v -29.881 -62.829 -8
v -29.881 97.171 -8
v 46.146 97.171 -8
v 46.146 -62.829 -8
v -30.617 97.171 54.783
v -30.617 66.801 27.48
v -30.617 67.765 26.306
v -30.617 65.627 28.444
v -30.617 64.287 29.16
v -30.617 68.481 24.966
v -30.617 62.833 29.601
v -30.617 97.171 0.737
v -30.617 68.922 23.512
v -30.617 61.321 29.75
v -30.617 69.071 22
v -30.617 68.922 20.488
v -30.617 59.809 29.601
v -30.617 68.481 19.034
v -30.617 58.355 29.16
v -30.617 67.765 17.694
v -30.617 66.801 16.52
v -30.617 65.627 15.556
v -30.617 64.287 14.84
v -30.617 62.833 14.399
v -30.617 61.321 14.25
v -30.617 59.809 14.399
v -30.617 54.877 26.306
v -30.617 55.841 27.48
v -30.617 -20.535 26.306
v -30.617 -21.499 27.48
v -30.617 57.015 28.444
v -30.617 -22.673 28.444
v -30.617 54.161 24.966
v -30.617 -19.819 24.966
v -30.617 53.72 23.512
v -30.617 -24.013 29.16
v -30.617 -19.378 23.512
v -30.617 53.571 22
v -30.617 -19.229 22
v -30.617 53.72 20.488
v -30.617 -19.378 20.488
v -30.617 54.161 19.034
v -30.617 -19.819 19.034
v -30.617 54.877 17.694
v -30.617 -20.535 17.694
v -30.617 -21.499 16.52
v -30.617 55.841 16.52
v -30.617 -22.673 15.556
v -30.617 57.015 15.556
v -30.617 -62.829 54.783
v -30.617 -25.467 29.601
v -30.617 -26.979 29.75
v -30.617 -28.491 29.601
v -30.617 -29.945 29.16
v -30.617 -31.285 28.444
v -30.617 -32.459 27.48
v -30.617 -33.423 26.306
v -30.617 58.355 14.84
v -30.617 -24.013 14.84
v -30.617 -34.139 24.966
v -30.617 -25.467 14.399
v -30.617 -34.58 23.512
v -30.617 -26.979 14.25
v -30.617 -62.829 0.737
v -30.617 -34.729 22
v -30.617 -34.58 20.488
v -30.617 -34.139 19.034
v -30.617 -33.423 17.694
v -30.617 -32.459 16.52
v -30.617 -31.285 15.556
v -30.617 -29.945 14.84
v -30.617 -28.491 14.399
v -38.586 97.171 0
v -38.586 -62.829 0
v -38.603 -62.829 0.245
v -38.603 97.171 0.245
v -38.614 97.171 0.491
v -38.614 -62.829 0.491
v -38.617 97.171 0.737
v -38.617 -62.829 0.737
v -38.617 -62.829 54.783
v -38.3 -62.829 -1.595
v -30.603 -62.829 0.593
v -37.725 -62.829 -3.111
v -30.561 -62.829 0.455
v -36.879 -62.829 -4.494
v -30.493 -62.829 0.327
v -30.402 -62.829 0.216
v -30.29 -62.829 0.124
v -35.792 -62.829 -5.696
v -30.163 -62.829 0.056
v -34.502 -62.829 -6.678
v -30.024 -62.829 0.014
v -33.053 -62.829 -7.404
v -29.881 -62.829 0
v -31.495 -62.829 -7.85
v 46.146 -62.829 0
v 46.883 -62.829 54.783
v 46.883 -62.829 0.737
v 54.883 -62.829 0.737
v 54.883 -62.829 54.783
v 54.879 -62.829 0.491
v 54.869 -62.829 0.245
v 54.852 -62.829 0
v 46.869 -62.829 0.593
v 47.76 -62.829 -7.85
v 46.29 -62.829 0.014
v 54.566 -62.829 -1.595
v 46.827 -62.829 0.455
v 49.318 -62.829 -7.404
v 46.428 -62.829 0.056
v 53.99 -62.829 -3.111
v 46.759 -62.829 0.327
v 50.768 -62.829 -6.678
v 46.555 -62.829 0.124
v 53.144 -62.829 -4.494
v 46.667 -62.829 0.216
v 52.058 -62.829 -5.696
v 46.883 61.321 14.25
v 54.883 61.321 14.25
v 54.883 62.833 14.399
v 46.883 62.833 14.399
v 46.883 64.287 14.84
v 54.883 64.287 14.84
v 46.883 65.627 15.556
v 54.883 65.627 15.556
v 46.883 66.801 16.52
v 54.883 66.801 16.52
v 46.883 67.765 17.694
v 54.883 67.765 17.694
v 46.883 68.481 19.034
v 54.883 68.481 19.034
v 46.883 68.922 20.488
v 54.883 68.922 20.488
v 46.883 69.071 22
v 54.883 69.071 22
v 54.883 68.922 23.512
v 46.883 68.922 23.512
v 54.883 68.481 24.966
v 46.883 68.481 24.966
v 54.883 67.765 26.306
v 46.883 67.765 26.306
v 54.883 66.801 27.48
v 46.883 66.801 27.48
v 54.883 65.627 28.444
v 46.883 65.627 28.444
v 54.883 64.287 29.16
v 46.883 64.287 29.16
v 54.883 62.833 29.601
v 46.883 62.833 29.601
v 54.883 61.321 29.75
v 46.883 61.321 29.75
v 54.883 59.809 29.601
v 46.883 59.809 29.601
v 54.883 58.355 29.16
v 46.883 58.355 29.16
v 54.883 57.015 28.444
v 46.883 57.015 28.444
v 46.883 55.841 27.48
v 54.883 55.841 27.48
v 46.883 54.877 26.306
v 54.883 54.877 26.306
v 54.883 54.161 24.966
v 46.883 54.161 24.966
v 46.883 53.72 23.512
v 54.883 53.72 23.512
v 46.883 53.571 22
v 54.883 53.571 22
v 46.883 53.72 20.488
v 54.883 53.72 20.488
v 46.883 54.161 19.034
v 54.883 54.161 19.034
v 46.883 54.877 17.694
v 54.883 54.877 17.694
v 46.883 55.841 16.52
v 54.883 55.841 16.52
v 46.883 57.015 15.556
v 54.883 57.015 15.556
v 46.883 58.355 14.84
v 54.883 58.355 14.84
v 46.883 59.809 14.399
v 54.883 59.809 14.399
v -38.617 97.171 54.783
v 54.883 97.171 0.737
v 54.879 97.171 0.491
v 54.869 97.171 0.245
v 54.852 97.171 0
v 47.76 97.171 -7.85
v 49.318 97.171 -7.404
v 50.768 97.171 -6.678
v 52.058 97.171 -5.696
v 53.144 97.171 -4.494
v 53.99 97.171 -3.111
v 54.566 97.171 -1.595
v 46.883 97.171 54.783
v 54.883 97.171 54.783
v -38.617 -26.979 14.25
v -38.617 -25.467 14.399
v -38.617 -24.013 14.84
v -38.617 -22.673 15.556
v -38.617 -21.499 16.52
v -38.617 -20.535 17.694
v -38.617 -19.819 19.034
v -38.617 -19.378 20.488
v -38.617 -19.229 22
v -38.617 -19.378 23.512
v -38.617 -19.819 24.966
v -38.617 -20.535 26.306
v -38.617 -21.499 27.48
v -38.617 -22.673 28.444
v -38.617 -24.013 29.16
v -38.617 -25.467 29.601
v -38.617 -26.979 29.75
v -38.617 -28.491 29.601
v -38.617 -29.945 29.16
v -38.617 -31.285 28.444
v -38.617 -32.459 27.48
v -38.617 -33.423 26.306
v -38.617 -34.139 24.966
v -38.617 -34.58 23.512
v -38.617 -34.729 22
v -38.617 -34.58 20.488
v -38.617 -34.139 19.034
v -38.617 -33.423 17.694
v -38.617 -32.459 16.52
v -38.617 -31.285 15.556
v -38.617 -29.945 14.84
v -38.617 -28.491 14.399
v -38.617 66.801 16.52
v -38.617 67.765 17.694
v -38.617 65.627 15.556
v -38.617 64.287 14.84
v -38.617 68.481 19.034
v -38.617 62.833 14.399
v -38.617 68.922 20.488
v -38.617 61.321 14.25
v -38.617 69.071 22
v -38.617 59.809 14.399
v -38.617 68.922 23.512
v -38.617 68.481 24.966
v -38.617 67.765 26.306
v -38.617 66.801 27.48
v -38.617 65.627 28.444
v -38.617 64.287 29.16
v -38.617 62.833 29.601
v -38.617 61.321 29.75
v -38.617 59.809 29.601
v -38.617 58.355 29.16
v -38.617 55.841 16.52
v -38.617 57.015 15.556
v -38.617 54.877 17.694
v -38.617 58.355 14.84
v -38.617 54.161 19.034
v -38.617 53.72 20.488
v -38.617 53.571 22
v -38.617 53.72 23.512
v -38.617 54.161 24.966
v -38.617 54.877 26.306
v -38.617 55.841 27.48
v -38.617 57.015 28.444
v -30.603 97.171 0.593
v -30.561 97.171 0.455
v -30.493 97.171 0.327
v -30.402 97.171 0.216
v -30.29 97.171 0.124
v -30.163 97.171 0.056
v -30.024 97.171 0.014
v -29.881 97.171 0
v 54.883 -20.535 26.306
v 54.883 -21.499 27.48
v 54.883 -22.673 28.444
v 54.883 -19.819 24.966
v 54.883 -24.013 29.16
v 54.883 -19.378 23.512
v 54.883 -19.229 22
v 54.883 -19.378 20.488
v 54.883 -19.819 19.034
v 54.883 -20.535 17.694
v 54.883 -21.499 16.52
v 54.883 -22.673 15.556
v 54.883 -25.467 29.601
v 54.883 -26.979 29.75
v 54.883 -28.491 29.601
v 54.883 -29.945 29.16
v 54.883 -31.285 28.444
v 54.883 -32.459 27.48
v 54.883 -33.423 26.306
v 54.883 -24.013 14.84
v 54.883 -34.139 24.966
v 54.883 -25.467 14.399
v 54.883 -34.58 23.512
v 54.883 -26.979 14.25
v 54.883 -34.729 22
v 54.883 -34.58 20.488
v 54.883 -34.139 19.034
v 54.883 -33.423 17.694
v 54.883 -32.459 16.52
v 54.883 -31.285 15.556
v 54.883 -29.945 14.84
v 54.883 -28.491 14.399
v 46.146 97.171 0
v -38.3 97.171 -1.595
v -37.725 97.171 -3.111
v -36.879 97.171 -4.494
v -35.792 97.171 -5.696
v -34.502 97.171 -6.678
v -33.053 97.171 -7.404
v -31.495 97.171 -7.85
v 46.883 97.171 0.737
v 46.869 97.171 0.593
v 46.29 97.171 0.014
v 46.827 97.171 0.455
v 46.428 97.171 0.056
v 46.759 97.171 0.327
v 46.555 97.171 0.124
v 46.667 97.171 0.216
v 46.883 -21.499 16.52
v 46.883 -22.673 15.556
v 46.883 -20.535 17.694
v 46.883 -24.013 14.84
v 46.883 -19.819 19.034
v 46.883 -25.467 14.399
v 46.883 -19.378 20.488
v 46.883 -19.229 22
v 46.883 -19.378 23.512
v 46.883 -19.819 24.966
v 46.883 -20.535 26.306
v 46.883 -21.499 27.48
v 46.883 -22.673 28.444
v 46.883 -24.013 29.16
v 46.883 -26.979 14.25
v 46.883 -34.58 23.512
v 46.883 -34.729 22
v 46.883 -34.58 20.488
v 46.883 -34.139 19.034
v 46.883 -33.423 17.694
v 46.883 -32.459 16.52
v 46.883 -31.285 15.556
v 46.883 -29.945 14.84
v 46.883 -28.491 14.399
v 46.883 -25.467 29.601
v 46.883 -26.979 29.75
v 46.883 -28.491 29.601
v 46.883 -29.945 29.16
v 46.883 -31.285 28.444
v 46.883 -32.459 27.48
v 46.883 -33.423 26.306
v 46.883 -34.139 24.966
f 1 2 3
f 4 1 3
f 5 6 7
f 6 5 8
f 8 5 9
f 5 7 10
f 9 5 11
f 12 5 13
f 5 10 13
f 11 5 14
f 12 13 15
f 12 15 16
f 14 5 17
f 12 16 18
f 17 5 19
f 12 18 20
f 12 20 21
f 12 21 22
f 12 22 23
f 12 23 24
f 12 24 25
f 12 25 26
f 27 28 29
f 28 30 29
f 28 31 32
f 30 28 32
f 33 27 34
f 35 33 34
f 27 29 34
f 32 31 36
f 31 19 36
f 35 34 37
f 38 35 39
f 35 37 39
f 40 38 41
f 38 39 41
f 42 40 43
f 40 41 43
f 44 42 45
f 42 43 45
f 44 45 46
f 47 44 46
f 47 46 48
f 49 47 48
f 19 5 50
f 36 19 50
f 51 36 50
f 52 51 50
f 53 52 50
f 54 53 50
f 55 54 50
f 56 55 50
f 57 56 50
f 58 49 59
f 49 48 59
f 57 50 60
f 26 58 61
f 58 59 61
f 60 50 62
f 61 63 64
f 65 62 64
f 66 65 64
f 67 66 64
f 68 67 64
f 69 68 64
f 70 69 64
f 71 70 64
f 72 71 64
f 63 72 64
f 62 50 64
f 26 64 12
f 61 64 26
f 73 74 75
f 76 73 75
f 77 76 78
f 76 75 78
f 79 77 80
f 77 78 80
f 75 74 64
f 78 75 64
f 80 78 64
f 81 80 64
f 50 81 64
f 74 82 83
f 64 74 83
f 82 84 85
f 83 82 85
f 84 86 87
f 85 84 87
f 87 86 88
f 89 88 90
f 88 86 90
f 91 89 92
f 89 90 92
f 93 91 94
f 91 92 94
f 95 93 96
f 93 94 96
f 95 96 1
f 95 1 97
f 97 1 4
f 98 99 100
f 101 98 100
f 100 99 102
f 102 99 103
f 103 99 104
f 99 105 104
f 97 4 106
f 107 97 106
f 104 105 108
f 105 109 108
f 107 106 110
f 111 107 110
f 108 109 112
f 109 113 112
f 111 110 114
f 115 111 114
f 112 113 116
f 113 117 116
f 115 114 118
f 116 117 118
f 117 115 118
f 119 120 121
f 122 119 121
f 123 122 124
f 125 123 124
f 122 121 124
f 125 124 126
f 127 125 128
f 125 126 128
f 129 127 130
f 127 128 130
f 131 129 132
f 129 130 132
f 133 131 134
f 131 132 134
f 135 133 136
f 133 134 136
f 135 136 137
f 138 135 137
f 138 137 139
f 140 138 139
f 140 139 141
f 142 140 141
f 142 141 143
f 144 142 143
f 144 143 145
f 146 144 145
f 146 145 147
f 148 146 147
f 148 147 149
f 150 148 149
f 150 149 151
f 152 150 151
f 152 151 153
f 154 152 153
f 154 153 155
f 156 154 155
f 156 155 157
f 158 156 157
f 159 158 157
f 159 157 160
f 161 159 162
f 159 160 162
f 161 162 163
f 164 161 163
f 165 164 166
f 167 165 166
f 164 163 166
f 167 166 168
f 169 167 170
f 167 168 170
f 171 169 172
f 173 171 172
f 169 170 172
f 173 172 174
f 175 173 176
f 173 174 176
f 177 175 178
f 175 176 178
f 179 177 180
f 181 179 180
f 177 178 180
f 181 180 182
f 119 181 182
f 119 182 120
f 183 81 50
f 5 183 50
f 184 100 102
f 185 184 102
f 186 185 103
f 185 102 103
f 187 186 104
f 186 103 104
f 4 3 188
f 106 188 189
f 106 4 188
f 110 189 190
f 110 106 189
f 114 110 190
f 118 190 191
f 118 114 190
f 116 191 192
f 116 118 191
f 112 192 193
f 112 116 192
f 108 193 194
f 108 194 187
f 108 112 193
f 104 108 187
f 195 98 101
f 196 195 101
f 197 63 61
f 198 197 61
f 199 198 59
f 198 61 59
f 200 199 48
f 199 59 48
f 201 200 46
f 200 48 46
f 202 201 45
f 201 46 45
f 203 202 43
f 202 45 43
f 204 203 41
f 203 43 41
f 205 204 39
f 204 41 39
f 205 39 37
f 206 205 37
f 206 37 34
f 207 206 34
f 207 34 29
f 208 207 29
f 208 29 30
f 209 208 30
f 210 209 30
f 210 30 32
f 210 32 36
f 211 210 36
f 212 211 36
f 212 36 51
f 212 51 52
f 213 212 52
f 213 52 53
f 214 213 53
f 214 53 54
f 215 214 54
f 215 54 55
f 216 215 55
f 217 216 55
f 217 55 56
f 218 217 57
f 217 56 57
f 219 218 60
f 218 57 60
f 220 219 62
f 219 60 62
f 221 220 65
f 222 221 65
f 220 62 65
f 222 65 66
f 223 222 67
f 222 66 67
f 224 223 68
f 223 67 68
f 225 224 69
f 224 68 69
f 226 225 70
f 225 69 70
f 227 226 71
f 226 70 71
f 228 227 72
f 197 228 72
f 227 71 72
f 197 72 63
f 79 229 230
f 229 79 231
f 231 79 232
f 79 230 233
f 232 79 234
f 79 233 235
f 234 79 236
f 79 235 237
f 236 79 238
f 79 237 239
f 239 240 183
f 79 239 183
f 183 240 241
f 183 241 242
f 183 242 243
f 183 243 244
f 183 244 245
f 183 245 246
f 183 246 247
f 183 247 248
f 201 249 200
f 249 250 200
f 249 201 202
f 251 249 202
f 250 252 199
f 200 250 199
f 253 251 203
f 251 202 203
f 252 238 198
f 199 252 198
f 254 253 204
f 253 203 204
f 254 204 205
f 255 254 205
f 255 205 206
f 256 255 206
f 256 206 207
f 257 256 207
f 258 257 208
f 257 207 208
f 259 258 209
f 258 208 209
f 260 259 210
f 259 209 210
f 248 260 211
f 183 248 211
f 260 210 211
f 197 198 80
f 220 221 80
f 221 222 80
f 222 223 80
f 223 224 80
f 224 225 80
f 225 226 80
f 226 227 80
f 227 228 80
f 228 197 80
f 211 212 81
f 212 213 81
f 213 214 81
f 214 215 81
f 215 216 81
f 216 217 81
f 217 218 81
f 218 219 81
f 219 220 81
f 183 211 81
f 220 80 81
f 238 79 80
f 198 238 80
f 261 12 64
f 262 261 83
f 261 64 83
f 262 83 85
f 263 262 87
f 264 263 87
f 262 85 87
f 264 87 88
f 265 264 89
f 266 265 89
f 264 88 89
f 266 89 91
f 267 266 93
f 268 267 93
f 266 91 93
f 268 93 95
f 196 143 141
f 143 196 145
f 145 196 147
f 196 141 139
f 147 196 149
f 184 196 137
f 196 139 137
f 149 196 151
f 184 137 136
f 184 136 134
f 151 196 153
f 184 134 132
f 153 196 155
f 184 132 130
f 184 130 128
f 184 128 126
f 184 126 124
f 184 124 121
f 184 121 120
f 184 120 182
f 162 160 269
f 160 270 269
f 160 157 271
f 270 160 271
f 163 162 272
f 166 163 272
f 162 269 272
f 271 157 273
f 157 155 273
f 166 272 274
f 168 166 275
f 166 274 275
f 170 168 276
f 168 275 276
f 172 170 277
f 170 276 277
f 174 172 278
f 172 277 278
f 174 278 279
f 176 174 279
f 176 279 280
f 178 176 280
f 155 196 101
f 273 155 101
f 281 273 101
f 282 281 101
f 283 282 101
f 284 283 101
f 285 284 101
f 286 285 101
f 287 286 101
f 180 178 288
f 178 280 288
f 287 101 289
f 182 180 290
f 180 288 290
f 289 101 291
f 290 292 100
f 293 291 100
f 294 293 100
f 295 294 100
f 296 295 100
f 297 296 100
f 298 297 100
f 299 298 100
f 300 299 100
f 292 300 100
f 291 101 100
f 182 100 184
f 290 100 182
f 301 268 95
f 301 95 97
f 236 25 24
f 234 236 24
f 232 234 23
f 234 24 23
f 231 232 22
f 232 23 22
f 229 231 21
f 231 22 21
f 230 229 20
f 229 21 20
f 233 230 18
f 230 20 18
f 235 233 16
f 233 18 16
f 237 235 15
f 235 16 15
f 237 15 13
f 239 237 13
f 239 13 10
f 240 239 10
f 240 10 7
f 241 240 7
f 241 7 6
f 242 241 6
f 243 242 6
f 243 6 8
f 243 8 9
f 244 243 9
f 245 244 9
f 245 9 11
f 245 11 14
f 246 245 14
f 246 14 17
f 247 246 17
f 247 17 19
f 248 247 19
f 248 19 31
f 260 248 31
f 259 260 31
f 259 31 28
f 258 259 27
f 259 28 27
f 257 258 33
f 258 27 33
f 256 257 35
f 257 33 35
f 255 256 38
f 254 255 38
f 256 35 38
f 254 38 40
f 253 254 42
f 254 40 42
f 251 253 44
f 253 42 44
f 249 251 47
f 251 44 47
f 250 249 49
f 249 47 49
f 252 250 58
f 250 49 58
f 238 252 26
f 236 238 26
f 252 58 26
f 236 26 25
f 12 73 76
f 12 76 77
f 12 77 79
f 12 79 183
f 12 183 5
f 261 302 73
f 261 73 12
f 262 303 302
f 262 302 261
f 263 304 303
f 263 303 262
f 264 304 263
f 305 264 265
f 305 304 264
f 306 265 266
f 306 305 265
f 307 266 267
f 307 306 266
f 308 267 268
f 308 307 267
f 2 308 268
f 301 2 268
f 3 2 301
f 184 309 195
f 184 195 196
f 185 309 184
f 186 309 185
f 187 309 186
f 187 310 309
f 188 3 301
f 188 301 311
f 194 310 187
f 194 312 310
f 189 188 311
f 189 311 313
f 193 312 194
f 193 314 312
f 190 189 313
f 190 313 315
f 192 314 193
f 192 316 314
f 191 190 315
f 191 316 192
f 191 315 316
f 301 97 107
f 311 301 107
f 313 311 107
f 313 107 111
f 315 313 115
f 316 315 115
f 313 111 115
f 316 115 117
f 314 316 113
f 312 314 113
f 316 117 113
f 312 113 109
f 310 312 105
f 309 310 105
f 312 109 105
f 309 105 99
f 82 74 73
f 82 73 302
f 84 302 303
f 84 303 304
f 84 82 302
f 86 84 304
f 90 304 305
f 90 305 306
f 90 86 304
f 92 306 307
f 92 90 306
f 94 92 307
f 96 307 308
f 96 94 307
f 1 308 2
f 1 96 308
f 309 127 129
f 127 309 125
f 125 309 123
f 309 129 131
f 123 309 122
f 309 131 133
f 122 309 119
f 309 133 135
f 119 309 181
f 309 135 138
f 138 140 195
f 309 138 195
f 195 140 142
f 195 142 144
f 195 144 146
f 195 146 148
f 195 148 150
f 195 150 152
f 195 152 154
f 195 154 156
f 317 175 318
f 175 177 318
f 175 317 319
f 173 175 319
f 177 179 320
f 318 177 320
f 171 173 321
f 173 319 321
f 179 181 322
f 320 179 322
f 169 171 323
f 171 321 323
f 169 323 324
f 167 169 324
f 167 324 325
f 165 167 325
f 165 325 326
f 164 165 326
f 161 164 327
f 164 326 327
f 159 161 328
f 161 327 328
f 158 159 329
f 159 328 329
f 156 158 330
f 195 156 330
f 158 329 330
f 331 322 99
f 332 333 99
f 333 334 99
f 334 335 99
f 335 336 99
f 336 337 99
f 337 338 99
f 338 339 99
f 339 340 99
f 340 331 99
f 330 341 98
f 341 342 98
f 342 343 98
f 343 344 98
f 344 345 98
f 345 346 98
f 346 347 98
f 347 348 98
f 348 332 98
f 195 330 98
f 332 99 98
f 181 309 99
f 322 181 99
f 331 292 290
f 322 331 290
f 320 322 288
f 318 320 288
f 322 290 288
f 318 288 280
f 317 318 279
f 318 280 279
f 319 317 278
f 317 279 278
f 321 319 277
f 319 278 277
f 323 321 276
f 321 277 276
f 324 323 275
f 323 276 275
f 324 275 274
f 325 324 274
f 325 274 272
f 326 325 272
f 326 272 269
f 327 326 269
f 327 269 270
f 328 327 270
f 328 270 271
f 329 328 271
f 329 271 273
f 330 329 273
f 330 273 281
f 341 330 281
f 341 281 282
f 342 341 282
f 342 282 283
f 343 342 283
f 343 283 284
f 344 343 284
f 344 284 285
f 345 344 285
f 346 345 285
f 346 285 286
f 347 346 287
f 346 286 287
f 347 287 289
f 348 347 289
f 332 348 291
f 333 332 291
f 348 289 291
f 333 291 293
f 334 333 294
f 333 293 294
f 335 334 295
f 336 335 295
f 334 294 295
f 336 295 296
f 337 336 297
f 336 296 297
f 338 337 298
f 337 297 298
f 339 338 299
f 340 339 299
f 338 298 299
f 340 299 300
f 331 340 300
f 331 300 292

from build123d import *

# Parameters (mm, degrees)
CROQUIS1_W                    = 199
CROQUIS1_H                    = 160
BRIDA_BASE1_DEPTH             = 8
PLIEGUE_START                 = -62.828947368
PLIEGUE_CROQUIZADO1_DEPTH     = 160
PLIEGUE_CROQUIZADO1_2_DEPTH   = 160
TALADRO_DE_MARGEN_PARA_M141_D = 15.5


# Read off the part's stored shape, not the designer's step: Pliegue croquizado1
# Sheet-metal steps are written as plain solids
with BuildPart() as part:
    # Croquis1 → Brida base1 (new body)
    with BuildSketch(Plane.XY):
        with Locations((8.132704294, 17.171052632)):
            Rectangle(CROQUIS1_W, CROQUIS1_H)
    extrude(amount=-BRIDA_BASE1_DEPTH)

    # Pliegue croquizado1 outline → Pliegue croquizado1 (cut)
    with BuildSketch(Plane(origin=(0, 0, 0), x_dir=(1, 0, 0), z_dir=(0, 1, 0)).offset(PLIEGUE_START)):
        with BuildLine():
            Line((107.632704294, 8), (46.146104294, 8))
            ThreePointArc((46.146104294, 8), (52.057652315, 5.696267134), (54.851596813, 0))
            Line((54.851596813, 0), (107.632704294, 0))
            Line((107.632704294, 0), (107.632704294, 8))
        make_face()
        with BuildLine():
            ThreePointArc((-38.586188225, 0), (-35.792243727, 5.696267134), (-29.880695706, 8))
            Line((-29.880695706, 8), (-91.367295706, 8))
            Line((-91.367295706, 8), (-91.367295706, 0))
            Line((-91.367295706, 0), (-38.586188225, 0))
        make_face()
    extrude(amount=PLIEGUE_CROQUIZADO1_DEPTH, mode=Mode.SUBTRACT)

    # Pliegue croquizado1 2 outline → Pliegue croquizado1 2 (add)
    with BuildSketch(Plane(origin=(0, 0, 0), x_dir=(1, 0, 0), z_dir=(0, 1, 0)).offset(PLIEGUE_START)):
        with BuildLine():
            ThreePointArc((54.882704294, -0.7366), (54.874923959, -0.36797172), (54.851596813, 0))
            Line((54.851596813, 0), (46.146104294, 0))
            ThreePointArc((46.146104294, 0), (46.666959149, -0.215745145), (46.882704294, -0.7366))
            Line((46.882704294, -0.7366), (46.882704294, -54.782966119))
            Line((46.882704294, -54.782966119), (54.882704294, -54.782966119))
            Line((54.882704294, -54.782966119), (54.882704294, -0.7366))
        make_face()
        with BuildLine():
            Line((-29.880695706, 0), (-38.586188225, 0))
            ThreePointArc((-38.586188225, 0), (-38.609515371, -0.36797172), (-38.617295706, -0.7366))
            Line((-38.617295706, -0.7366), (-38.617295706, -54.782966119))
            Line((-38.617295706, -54.782966119), (-30.617295706, -54.782966119))
            Line((-30.617295706, -54.782966119), (-30.617295706, -0.7366))
            ThreePointArc((-30.617295706, -0.7366), (-30.401550561, -0.215745145), (-29.880695706, 0))
        make_face()
    extrude(amount=PLIEGUE_CROQUIZADO1_2_DEPTH)

    # Taladro de margen para M141 (through all)
    with Locations(Plane.ZY.offset(38.617295706)):
        with Locations((22, -26.978947368), (22, 61.321052632)):
            Hole(TALADRO_DE_MARGEN_PARA_M141_D / 2)


solid = part.part
